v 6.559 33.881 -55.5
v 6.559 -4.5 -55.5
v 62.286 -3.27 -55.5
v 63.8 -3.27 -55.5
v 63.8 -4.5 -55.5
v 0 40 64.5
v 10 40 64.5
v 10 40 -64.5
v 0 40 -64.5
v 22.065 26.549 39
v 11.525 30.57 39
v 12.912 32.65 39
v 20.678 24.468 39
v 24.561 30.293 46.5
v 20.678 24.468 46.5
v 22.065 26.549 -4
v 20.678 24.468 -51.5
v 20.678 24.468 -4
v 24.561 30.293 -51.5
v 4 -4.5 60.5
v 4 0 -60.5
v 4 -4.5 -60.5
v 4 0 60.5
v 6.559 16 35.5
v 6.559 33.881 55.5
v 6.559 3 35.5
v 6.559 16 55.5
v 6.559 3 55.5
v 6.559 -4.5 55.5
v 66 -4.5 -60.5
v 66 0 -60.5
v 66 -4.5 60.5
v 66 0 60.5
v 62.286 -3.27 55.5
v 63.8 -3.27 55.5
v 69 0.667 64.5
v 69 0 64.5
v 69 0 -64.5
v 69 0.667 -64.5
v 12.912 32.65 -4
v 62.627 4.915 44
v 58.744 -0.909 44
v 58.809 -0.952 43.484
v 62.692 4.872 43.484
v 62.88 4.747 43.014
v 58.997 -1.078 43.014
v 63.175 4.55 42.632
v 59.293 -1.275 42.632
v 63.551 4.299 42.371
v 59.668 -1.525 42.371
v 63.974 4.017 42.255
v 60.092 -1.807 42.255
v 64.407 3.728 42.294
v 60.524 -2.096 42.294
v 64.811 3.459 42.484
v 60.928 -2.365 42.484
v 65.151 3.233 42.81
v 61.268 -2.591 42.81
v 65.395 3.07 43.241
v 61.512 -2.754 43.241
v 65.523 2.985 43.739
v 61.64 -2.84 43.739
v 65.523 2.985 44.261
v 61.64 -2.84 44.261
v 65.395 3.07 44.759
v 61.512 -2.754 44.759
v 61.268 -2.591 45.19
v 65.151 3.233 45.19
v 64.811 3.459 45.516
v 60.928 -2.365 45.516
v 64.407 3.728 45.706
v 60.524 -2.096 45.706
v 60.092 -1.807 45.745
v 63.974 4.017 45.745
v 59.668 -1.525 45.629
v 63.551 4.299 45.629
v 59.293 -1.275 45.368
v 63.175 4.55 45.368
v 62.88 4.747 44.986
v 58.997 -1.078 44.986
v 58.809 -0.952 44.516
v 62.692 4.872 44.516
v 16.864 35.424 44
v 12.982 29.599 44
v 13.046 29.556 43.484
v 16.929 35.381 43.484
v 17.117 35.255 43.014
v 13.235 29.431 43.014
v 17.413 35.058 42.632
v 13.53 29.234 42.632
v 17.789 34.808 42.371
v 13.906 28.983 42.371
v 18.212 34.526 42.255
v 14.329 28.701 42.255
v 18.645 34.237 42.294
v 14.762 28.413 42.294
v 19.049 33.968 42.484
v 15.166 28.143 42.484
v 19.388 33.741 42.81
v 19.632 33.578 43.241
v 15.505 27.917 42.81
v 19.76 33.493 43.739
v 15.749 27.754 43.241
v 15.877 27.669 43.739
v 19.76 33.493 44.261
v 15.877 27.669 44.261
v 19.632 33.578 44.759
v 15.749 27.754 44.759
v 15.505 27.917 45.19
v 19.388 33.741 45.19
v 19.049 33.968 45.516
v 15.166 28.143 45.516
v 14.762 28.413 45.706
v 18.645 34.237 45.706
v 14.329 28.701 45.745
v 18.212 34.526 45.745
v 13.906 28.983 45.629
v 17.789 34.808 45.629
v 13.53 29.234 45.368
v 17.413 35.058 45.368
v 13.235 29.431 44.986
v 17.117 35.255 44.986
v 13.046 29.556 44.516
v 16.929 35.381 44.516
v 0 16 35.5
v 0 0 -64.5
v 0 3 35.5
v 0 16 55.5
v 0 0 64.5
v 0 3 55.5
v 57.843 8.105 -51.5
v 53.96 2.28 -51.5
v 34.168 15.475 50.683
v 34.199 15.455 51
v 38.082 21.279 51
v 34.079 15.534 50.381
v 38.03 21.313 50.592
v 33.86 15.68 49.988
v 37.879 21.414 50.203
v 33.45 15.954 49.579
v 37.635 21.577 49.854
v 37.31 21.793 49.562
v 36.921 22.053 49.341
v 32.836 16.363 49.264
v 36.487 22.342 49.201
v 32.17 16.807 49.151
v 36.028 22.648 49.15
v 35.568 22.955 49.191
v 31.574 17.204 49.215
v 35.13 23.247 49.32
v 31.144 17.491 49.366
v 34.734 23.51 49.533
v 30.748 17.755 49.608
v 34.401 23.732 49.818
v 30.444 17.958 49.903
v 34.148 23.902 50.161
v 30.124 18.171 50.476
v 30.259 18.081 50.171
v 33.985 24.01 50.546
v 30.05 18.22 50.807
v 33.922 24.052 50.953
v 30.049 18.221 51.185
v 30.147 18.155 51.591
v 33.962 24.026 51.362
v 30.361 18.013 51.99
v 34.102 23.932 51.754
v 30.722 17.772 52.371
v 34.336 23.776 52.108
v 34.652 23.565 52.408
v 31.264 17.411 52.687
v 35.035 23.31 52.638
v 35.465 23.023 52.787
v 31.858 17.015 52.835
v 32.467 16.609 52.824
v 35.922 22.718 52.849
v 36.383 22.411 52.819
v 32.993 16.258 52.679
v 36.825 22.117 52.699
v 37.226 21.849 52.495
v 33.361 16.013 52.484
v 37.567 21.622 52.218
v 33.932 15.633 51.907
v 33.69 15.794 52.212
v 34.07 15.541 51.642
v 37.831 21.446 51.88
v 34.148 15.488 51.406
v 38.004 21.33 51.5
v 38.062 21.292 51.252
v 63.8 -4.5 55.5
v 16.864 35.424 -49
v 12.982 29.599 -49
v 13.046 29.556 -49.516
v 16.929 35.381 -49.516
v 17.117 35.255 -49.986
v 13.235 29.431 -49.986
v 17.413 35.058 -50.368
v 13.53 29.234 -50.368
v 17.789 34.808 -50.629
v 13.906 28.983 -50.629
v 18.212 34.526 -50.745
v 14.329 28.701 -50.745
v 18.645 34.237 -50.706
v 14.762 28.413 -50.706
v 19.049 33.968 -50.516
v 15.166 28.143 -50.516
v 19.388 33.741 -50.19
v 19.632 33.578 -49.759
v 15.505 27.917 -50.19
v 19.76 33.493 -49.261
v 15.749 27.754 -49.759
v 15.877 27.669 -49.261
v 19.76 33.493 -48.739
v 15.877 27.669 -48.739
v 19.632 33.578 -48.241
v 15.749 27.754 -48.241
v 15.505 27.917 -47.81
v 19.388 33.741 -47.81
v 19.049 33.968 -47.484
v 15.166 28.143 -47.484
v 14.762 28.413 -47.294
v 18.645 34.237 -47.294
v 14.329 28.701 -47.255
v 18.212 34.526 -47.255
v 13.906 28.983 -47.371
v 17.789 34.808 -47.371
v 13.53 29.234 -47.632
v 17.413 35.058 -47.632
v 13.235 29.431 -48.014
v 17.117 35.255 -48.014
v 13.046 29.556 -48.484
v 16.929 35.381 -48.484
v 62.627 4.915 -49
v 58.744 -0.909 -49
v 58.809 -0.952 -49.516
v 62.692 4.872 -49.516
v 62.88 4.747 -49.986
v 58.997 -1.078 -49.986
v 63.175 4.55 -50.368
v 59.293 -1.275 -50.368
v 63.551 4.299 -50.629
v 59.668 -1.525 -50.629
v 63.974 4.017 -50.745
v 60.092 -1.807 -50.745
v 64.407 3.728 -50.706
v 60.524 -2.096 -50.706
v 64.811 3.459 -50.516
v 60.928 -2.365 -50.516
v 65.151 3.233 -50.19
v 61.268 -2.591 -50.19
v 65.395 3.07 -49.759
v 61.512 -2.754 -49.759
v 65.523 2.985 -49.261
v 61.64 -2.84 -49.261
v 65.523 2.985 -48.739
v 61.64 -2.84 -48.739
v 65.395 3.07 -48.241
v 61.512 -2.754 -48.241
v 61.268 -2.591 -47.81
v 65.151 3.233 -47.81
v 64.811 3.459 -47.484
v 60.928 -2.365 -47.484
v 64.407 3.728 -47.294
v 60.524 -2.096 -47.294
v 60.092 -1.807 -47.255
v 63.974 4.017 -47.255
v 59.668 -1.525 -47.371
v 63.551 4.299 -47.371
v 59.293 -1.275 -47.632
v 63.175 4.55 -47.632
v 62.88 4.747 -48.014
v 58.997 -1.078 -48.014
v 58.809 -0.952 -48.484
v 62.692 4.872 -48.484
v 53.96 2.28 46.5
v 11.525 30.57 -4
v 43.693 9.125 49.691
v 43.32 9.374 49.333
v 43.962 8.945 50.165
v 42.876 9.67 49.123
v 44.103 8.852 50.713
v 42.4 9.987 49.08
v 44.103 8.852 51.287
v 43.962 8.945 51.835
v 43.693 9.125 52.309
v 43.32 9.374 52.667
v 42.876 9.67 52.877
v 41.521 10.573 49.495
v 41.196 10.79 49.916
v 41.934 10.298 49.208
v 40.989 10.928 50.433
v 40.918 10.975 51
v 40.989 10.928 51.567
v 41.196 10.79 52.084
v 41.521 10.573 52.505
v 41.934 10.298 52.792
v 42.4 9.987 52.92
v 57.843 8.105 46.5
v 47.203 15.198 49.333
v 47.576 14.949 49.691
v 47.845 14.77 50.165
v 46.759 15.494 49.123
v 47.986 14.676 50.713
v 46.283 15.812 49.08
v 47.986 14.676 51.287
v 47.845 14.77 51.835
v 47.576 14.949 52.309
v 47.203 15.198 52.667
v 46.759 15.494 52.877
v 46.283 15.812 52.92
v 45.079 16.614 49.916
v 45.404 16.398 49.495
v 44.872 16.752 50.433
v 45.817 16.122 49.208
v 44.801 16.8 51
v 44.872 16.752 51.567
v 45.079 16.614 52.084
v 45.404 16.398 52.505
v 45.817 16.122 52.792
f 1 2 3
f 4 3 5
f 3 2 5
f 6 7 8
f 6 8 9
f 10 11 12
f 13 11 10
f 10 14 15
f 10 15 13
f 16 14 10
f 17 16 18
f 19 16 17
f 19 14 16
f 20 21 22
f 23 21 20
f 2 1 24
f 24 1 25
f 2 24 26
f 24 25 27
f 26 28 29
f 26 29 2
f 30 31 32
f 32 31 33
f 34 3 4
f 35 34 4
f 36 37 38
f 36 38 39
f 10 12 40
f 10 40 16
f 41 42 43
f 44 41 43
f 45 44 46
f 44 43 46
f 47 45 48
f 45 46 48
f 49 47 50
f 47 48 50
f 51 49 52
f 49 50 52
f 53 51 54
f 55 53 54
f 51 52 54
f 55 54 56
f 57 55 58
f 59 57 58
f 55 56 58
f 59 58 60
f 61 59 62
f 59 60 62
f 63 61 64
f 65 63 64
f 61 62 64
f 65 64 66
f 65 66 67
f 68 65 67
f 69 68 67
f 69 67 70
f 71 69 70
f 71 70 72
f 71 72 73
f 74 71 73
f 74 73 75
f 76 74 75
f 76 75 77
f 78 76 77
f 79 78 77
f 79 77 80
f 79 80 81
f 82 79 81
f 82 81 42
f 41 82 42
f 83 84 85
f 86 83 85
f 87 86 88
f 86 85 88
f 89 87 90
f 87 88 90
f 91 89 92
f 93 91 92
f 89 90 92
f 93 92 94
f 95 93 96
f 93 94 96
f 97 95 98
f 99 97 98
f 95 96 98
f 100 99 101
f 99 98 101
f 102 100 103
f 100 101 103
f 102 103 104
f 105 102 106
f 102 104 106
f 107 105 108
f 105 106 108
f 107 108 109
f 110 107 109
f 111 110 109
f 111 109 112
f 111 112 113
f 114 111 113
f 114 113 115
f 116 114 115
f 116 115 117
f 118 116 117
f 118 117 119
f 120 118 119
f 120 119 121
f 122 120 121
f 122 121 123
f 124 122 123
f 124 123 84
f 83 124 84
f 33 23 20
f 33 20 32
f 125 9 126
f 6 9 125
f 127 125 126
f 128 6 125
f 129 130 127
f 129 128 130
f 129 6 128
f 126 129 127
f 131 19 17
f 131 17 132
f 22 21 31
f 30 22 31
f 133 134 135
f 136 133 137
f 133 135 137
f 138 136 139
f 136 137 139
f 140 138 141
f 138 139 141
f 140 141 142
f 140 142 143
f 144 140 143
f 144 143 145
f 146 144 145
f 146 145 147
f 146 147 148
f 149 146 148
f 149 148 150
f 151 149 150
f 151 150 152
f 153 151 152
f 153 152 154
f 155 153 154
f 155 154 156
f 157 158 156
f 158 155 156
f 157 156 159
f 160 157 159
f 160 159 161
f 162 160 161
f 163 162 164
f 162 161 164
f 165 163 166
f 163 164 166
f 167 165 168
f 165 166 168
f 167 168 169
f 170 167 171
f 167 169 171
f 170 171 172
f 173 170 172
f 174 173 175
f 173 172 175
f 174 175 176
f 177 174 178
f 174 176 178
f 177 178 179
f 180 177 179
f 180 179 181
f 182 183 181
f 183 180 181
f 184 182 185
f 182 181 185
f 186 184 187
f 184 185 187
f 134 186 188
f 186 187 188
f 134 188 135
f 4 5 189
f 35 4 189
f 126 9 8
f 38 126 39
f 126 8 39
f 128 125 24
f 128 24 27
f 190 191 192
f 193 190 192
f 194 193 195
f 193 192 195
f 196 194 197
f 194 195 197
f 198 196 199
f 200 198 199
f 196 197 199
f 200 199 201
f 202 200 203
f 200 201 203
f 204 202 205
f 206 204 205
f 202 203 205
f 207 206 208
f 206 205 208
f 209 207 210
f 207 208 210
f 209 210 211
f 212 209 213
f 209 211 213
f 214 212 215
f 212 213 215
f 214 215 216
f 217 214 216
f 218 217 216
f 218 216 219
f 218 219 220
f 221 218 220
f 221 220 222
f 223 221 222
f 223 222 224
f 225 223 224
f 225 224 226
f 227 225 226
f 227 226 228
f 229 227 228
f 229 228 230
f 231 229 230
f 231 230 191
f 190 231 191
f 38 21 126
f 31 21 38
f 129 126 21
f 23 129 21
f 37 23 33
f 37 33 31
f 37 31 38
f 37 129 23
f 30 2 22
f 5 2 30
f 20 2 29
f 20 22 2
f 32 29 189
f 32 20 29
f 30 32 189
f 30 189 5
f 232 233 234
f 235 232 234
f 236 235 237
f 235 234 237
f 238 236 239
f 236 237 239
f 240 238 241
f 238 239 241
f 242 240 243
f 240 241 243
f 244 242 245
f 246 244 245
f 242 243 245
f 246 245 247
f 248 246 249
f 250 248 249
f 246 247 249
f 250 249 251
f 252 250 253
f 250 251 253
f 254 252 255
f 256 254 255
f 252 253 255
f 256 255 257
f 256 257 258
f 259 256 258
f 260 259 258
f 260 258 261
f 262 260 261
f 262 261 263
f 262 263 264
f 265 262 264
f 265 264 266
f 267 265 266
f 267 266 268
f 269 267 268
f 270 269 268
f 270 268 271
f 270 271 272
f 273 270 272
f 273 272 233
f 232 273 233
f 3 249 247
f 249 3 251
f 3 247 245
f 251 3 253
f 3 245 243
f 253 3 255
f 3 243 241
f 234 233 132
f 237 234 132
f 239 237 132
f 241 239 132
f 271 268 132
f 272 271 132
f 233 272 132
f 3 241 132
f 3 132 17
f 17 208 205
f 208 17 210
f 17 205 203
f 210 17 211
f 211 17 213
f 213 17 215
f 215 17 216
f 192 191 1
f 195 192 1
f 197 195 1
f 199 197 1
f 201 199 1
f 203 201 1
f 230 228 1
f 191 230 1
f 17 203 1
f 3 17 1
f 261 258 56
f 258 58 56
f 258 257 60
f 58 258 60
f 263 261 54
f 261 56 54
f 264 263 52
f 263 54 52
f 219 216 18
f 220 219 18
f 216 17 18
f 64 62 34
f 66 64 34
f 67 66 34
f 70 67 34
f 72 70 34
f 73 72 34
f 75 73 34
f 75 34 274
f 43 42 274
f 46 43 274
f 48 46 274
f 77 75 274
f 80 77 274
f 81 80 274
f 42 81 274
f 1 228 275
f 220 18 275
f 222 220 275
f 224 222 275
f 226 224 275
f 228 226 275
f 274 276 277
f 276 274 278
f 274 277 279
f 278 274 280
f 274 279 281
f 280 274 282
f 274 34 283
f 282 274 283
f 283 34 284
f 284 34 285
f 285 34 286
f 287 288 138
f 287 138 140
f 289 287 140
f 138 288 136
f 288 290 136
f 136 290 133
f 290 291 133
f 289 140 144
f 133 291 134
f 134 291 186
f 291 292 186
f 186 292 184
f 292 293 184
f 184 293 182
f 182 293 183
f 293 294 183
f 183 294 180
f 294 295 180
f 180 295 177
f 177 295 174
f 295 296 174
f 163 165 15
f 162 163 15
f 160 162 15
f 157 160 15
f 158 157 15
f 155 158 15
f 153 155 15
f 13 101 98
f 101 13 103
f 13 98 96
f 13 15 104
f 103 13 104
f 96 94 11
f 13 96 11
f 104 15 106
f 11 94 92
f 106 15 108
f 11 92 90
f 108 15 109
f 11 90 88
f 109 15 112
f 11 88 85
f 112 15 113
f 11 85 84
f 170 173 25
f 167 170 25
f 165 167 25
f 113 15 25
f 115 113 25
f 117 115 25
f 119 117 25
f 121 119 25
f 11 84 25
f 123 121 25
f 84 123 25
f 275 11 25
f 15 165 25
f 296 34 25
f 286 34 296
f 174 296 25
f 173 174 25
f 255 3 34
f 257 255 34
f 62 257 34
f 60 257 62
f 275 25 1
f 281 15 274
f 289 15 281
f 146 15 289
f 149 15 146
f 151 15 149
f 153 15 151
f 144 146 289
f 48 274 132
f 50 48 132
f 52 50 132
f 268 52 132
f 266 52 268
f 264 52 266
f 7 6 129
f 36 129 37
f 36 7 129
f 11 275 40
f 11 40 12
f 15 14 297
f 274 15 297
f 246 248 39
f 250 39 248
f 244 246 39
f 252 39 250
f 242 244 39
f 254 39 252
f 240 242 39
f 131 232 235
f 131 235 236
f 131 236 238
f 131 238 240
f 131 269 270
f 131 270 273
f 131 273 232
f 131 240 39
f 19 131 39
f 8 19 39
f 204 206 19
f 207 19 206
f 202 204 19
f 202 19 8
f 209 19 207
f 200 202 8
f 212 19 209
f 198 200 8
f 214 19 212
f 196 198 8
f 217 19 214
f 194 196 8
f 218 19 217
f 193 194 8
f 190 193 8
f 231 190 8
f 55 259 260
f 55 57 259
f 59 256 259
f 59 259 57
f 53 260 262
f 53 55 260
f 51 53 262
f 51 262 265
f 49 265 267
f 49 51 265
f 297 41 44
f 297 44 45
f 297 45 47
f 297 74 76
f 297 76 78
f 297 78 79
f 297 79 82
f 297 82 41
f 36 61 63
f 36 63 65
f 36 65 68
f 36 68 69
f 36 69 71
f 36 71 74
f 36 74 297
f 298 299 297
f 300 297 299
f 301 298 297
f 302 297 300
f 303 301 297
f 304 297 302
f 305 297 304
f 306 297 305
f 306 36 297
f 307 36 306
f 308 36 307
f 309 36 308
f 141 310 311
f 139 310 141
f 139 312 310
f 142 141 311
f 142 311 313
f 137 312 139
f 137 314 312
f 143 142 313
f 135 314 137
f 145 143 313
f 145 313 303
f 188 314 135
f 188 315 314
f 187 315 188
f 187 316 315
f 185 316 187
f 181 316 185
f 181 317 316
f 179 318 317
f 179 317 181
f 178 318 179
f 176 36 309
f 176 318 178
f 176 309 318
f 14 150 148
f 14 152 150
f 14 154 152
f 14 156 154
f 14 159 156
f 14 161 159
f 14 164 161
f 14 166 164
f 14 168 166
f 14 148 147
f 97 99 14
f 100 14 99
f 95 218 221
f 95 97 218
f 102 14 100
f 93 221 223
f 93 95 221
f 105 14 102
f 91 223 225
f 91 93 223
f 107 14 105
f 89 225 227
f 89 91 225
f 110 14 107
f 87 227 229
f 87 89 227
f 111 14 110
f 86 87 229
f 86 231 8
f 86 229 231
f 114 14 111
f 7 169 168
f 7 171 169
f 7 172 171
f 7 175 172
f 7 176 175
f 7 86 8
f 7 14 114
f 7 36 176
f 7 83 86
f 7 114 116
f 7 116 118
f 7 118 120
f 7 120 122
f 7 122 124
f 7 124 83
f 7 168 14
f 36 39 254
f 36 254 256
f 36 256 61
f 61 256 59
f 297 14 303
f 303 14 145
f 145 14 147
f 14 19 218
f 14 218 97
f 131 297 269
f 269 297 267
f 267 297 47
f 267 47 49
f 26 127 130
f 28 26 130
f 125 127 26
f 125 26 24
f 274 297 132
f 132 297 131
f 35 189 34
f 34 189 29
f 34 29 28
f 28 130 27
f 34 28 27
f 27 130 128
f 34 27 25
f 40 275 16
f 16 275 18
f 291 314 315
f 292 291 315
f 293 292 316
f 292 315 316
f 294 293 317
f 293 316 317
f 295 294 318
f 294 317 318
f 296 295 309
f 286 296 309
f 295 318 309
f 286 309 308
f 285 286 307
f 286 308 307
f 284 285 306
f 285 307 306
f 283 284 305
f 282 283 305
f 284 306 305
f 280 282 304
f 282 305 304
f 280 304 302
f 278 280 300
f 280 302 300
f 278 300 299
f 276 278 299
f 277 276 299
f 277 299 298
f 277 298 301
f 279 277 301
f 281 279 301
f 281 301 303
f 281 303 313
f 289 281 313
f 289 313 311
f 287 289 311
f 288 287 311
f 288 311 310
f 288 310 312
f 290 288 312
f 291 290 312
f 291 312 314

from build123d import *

# Parameters (mm, degrees)
BOSS_EXTRUDE1_DEPTH       = 64.5
SKETCH3_W                 = 62
SKETCH3_H                 = 121
BOSS_EXTRUDE3_DEPTH       = 4.5
SKETCH6_W                 = 40
SKETCH6_H                 = 98
CUT_EXTRUDE3_DEPTH        = 7
SKETCH5_W                 = 57.24
SKETCH5_H                 = 111
CUT_EXTRUDE2_DEPTH        = 1.23
CUT_EXTRUDE1_DEPTH        = 111
CUT_EXTRUDE4_REACH        = 90.677
SKETCH7_R                 = 1.925
SKETCH7_RX                = 2.5
SKETCH7_RY                = 1.85
F_1_0MM_DOWEL_HOLE1_D     = 3.5
F_1_0MM_DOWEL_HOLE1_DEPTH = 7
SKETCH10_W                = 20
SKETCH10_H                = 13
CUT_EXTRUDE5_DEPTH        = 10
SKETCH11_W                = 11
SKETCH11_H                = 43
CUT_EXTRUDE6_DEPTH        = 2.5
SKETCH12_W                = 2
SKETCH12_H                = 8.260777535
CUT_EXTRUDE7_DEPTH        = 153.121661837


with BuildPart() as part:
    # Sketch1 → Boss-Extrude1 (new, symmetric)
    with BuildSketch(Plane.XY):
        Polygon((0, 0), (70, 0), (10, 40), (0, 40), align=None)
    extrude(amount=BOSS_EXTRUDE1_DEPTH, both=True)

    # Sketch3 → Boss-Extrude3 (add)
    with BuildSketch(Plane.XZ):
        with Locations((35, 0)):
            Rectangle(SKETCH3_W, SKETCH3_H)
    extrude(amount=BOSS_EXTRUDE3_DEPTH)

    # Sketch6 → Cut-Extrude3 (cut)
    with BuildSketch(Plane(origin=(21.538461538, 32.307692308, 0), x_dir=(0.8320502943378438, -0.5547001962252291, 0), z_dir=(0.5547001962252291, 0.8320502943378438, 0))):
        with Locations((23.632495094, 2.5)):
            Rectangle(SKETCH6_W, SKETCH6_H)
    extrude(amount=-CUT_EXTRUDE3_DEPTH, mode=Mode.SUBTRACT)

    # Sketch5 → Cut-Extrude2 (cut)
    with BuildSketch(Plane.XZ.offset(4.5)):
        with Locations((35.18, 0)):
            Rectangle(SKETCH5_W, SKETCH5_H)
    extrude(amount=-CUT_EXTRUDE2_DEPTH, mode=Mode.SUBTRACT)

    # Sketch4 → Cut-Extrude1 (cut)
    with BuildSketch(Plane.XY.offset(55.5)):
        Polygon((63.780493494, -4.266615306), (6.558549313, 33.881347482), (6.558549313, -4.5), (63.780493494, -4.5), align=None)
    extrude(amount=-CUT_EXTRUDE1_DEPTH, mode=Mode.SUBTRACT)

    # Sketch7 → Cut-Extrude4 (cut, up to next)
    with BuildSketch(Plane(origin=(21.538461538, 32.307692308, 0), x_dir=(0.8320502943378438, -0.5547001962252291, 0), z_dir=(0.5547001962252291, 0.8320502943378438, 0)), mode=Mode.PRIVATE) as cut_extrude4_sk1:
        with Locations(Location((29.882495094, -51, 0), (0, 0, 180))):
            Circle(SKETCH7_R)
    cut_extrude4_tool1 = extrude(cut_extrude4_sk1.sketch, amount=-CUT_EXTRUDE4_REACH, mode=Mode.PRIVATE) & part.part
    # Sketch7 → Cut-Extrude4 (cut, up to next)
    with BuildSketch(Plane(origin=(21.538461538, 32.307692308, 0), x_dir=(0.8320502943378438, -0.5547001962252291, 0), z_dir=(0.5547001962252291, 0.8320502943378438, 0)), mode=Mode.PRIVATE) as cut_extrude4_sk2:
        with Locations((17.382495094, -51)):
            Ellipse(SKETCH7_RX, SKETCH7_RY)
    cut_extrude4_tool2 = extrude(cut_extrude4_sk2.sketch, amount=-CUT_EXTRUDE4_REACH, mode=Mode.PRIVATE) & part.part
    add(cut_extrude4_tool1.solids().sort_by_distance((46.4022, 15.731866, 51))[0], mode=Mode.SUBTRACT)
    add(cut_extrude4_tool2.solids().sort_by_distance((36.001572, 22.665619, 51))[0], mode=Mode.SUBTRACT)

    # Ø1.0mm Dowel Hole1
    with Locations(Plane(origin=(21.538461538, 32.307692308, 0), x_dir=(0.8320502943378438, -0.5547001962252291, 0), z_dir=(0.5547001962252291, 0.8320502943378438, 0))):
        with Locations((-3.867504906, -44), (-3.867504906, 49), (51.132495094, 49), (51.132495094, -44)):
            Hole(F_1_0MM_DOWEL_HOLE1_D / 2, depth=F_1_0MM_DOWEL_HOLE1_DEPTH)

    # Sketch10 → Cut-Extrude5 (cut)
    with BuildSketch(Plane.ZY):
        with Locations((45.5, 9.5)):
            Rectangle(SKETCH10_W, SKETCH10_H)
    extrude(amount=-CUT_EXTRUDE5_DEPTH, mode=Mode.SUBTRACT)

    # Sketch11 → Cut-Extrude6 (cut)
    with BuildSketch(Plane(origin=(17.655560165, 26.483340247, 0), x_dir=(0.8320502943378436, -0.5547001962252294, 0), z_dir=(-0.5547001962252293, -0.8320502943378435, 0))):
        with Locations((-1.867504906, 17.5)):
            Rectangle(SKETCH11_W, SKETCH11_H)
    extrude(amount=-CUT_EXTRUDE6_DEPTH, mode=Mode.SUBTRACT)

    # Sketch12 → Cut-Extrude7 (cut, through all)
    with BuildSketch(Plane.XY.offset(64.5)):
        with Locations((70, 0.079119359)):
            Rectangle(SKETCH12_W, SKETCH12_H)
    extrude(amount=-CUT_EXTRUDE7_DEPTH, mode=Mode.SUBTRACT)


solid = part.part
